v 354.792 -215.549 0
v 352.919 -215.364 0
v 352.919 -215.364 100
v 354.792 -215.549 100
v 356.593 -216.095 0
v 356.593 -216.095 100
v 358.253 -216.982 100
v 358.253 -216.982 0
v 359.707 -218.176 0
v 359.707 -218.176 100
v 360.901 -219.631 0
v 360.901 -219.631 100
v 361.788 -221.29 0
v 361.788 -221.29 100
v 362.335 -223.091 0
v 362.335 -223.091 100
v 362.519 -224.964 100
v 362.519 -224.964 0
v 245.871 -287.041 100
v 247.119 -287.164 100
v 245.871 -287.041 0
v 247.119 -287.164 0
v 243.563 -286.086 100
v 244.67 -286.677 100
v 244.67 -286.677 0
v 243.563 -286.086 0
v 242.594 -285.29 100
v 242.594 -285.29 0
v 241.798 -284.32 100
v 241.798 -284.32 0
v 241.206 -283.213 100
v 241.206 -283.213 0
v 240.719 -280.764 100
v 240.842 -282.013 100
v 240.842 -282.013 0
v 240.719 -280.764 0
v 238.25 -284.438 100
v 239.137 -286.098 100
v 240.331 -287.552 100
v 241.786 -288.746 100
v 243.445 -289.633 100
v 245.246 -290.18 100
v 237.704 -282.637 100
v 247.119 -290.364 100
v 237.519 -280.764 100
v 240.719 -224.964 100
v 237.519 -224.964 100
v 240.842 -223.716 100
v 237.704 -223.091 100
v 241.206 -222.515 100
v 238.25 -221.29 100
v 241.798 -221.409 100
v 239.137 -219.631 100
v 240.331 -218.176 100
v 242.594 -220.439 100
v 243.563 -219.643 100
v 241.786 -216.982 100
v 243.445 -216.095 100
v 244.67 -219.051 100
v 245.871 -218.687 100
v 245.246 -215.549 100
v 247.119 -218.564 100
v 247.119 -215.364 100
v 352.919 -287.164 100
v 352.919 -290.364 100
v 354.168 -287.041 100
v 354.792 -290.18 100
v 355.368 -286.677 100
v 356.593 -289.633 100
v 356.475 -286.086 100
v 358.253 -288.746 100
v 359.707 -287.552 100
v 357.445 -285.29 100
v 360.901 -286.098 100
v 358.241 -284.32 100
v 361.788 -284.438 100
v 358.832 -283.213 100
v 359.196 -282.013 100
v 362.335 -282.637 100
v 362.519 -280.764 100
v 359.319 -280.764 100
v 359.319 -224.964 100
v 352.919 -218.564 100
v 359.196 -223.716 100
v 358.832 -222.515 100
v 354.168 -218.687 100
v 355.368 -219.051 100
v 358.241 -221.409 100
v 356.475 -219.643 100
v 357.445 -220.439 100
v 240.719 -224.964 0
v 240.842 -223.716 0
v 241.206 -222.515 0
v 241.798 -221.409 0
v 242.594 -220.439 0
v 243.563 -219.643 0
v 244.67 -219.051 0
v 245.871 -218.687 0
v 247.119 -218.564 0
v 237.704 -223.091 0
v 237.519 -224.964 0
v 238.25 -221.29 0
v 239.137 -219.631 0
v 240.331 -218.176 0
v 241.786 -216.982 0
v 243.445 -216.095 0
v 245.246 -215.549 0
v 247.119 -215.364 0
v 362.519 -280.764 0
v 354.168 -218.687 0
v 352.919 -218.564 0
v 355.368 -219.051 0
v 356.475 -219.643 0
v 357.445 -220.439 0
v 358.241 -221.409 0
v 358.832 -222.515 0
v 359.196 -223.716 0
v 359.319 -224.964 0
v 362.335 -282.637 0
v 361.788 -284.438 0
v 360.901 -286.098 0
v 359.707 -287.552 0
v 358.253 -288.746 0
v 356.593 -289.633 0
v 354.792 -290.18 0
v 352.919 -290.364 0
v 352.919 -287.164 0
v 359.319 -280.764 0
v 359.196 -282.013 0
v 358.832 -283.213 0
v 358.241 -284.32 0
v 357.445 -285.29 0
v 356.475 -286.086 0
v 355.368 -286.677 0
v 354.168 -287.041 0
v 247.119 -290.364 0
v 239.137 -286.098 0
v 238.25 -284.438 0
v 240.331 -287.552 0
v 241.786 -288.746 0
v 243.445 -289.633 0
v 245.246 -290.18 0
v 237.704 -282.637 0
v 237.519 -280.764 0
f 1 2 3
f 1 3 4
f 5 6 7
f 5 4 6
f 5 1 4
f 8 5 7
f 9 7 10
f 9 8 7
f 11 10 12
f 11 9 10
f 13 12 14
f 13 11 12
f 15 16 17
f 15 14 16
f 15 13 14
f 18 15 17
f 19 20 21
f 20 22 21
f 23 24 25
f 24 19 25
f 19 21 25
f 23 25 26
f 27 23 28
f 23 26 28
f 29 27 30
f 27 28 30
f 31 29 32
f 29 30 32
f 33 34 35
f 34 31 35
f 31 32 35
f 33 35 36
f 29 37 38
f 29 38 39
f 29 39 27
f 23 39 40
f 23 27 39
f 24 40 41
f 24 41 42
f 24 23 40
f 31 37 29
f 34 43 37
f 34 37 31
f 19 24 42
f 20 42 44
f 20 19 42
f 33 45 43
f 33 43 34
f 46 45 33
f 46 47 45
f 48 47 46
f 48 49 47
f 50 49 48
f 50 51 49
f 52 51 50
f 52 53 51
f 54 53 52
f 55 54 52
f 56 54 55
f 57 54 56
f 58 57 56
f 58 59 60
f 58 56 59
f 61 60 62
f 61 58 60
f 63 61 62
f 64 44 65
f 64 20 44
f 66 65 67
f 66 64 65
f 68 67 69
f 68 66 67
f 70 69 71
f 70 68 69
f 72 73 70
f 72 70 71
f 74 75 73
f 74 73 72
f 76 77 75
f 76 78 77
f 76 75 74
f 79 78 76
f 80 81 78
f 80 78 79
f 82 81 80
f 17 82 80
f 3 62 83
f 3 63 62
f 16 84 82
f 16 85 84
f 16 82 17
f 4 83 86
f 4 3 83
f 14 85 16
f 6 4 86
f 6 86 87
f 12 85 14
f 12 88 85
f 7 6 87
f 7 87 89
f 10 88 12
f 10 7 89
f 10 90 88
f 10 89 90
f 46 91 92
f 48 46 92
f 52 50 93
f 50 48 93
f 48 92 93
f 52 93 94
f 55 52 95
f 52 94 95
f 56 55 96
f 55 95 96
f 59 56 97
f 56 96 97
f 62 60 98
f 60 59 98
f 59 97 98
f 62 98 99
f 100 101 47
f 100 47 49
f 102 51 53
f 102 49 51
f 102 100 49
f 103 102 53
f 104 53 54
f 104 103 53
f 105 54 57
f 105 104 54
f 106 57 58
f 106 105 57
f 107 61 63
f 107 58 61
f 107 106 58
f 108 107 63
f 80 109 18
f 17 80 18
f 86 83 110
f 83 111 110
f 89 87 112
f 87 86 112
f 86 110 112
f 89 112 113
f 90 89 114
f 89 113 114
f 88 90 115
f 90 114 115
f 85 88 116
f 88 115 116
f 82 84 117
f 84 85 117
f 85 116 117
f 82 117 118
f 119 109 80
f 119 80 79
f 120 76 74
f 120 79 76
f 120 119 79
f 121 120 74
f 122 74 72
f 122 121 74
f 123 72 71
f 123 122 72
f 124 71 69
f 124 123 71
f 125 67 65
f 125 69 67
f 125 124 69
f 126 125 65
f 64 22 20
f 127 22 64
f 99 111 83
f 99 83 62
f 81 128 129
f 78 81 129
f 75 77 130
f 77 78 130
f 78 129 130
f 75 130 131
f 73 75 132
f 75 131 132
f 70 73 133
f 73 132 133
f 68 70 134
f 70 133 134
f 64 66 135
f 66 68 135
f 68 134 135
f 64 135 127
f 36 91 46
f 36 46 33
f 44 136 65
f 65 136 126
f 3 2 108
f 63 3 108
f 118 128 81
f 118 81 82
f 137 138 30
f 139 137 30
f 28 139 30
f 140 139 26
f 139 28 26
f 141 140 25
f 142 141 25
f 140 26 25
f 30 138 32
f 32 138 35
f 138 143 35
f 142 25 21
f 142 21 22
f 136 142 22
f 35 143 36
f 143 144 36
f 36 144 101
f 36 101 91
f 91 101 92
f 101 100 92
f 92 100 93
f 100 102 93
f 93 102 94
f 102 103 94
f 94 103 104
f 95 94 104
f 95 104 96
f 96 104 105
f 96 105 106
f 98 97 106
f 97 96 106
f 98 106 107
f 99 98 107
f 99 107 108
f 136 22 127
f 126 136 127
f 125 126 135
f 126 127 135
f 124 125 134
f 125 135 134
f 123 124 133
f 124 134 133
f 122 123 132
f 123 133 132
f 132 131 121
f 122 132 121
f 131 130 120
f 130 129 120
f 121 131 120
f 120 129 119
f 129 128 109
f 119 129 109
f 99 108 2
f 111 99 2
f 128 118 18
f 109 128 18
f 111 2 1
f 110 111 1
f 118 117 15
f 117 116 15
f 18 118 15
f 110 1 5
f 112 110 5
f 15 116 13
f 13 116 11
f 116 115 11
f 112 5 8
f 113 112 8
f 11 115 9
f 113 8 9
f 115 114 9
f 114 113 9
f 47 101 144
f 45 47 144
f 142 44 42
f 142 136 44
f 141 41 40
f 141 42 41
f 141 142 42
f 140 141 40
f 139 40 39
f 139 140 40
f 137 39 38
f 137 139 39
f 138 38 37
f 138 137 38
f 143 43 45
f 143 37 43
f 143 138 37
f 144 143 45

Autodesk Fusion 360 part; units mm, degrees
sketch "スケッチ1" plane through (0, 0, 0) normal (0, 0, 1) x (1, 0, 0)
  line L0 (247.1191, -287.1642) -> (352.9191, -287.1642)
  line L1 (352.9191, -215.3642) -> (247.1191, -215.3642)
  line L2 (352.9191, -218.5642) -> (247.1191, -218.5642)
  line L3 (237.5191, -224.9642) -> (237.5191, -280.7642)
  line L4 (240.7191, -224.9642) -> (240.7191, -280.7642)
  arc A0 (240.7191, -280.7642) -> (247.1191, -287.1642) centre (247.1191, -280.7642) ccw
  arc A1 (247.1191, -215.3642) -> (237.5191, -224.9642) centre (247.1191, -224.9642) ccw
  arc A2 (247.1191, -218.5642) -> (240.7191, -224.9642) centre (247.1191, -224.9642) ccw
  line L5 (362.5191, -280.7642) -> (362.5191, -224.9642)
  line L6 (359.3191, -280.7642) -> (359.3191, -224.9642)
  arc A3 (352.9191, -287.1642) -> (359.3191, -280.7642) centre (352.9191, -280.7642) ccw
  arc A4 (362.5191, -224.9642) -> (352.9191, -215.3642) centre (352.9191, -224.9642) ccw
  arc A5 (359.3191, -224.9642) -> (352.9191, -218.5642) centre (352.9191, -224.9642) ccw
  line L7 (247.1191, -290.3642) -> (352.9191, -290.3642)
  arc A6 (237.5191, -280.7642) -> (247.1191, -290.3642) centre (247.1191, -280.7642) ccw
  arc A7 (352.9191, -290.3642) -> (362.5191, -280.7642) centre (352.9191, -280.7642) ccw
  point P0 (300.0191, -252.8642)
extrude "押し出し1" add sketch "スケッチ1" along normal blind 100
